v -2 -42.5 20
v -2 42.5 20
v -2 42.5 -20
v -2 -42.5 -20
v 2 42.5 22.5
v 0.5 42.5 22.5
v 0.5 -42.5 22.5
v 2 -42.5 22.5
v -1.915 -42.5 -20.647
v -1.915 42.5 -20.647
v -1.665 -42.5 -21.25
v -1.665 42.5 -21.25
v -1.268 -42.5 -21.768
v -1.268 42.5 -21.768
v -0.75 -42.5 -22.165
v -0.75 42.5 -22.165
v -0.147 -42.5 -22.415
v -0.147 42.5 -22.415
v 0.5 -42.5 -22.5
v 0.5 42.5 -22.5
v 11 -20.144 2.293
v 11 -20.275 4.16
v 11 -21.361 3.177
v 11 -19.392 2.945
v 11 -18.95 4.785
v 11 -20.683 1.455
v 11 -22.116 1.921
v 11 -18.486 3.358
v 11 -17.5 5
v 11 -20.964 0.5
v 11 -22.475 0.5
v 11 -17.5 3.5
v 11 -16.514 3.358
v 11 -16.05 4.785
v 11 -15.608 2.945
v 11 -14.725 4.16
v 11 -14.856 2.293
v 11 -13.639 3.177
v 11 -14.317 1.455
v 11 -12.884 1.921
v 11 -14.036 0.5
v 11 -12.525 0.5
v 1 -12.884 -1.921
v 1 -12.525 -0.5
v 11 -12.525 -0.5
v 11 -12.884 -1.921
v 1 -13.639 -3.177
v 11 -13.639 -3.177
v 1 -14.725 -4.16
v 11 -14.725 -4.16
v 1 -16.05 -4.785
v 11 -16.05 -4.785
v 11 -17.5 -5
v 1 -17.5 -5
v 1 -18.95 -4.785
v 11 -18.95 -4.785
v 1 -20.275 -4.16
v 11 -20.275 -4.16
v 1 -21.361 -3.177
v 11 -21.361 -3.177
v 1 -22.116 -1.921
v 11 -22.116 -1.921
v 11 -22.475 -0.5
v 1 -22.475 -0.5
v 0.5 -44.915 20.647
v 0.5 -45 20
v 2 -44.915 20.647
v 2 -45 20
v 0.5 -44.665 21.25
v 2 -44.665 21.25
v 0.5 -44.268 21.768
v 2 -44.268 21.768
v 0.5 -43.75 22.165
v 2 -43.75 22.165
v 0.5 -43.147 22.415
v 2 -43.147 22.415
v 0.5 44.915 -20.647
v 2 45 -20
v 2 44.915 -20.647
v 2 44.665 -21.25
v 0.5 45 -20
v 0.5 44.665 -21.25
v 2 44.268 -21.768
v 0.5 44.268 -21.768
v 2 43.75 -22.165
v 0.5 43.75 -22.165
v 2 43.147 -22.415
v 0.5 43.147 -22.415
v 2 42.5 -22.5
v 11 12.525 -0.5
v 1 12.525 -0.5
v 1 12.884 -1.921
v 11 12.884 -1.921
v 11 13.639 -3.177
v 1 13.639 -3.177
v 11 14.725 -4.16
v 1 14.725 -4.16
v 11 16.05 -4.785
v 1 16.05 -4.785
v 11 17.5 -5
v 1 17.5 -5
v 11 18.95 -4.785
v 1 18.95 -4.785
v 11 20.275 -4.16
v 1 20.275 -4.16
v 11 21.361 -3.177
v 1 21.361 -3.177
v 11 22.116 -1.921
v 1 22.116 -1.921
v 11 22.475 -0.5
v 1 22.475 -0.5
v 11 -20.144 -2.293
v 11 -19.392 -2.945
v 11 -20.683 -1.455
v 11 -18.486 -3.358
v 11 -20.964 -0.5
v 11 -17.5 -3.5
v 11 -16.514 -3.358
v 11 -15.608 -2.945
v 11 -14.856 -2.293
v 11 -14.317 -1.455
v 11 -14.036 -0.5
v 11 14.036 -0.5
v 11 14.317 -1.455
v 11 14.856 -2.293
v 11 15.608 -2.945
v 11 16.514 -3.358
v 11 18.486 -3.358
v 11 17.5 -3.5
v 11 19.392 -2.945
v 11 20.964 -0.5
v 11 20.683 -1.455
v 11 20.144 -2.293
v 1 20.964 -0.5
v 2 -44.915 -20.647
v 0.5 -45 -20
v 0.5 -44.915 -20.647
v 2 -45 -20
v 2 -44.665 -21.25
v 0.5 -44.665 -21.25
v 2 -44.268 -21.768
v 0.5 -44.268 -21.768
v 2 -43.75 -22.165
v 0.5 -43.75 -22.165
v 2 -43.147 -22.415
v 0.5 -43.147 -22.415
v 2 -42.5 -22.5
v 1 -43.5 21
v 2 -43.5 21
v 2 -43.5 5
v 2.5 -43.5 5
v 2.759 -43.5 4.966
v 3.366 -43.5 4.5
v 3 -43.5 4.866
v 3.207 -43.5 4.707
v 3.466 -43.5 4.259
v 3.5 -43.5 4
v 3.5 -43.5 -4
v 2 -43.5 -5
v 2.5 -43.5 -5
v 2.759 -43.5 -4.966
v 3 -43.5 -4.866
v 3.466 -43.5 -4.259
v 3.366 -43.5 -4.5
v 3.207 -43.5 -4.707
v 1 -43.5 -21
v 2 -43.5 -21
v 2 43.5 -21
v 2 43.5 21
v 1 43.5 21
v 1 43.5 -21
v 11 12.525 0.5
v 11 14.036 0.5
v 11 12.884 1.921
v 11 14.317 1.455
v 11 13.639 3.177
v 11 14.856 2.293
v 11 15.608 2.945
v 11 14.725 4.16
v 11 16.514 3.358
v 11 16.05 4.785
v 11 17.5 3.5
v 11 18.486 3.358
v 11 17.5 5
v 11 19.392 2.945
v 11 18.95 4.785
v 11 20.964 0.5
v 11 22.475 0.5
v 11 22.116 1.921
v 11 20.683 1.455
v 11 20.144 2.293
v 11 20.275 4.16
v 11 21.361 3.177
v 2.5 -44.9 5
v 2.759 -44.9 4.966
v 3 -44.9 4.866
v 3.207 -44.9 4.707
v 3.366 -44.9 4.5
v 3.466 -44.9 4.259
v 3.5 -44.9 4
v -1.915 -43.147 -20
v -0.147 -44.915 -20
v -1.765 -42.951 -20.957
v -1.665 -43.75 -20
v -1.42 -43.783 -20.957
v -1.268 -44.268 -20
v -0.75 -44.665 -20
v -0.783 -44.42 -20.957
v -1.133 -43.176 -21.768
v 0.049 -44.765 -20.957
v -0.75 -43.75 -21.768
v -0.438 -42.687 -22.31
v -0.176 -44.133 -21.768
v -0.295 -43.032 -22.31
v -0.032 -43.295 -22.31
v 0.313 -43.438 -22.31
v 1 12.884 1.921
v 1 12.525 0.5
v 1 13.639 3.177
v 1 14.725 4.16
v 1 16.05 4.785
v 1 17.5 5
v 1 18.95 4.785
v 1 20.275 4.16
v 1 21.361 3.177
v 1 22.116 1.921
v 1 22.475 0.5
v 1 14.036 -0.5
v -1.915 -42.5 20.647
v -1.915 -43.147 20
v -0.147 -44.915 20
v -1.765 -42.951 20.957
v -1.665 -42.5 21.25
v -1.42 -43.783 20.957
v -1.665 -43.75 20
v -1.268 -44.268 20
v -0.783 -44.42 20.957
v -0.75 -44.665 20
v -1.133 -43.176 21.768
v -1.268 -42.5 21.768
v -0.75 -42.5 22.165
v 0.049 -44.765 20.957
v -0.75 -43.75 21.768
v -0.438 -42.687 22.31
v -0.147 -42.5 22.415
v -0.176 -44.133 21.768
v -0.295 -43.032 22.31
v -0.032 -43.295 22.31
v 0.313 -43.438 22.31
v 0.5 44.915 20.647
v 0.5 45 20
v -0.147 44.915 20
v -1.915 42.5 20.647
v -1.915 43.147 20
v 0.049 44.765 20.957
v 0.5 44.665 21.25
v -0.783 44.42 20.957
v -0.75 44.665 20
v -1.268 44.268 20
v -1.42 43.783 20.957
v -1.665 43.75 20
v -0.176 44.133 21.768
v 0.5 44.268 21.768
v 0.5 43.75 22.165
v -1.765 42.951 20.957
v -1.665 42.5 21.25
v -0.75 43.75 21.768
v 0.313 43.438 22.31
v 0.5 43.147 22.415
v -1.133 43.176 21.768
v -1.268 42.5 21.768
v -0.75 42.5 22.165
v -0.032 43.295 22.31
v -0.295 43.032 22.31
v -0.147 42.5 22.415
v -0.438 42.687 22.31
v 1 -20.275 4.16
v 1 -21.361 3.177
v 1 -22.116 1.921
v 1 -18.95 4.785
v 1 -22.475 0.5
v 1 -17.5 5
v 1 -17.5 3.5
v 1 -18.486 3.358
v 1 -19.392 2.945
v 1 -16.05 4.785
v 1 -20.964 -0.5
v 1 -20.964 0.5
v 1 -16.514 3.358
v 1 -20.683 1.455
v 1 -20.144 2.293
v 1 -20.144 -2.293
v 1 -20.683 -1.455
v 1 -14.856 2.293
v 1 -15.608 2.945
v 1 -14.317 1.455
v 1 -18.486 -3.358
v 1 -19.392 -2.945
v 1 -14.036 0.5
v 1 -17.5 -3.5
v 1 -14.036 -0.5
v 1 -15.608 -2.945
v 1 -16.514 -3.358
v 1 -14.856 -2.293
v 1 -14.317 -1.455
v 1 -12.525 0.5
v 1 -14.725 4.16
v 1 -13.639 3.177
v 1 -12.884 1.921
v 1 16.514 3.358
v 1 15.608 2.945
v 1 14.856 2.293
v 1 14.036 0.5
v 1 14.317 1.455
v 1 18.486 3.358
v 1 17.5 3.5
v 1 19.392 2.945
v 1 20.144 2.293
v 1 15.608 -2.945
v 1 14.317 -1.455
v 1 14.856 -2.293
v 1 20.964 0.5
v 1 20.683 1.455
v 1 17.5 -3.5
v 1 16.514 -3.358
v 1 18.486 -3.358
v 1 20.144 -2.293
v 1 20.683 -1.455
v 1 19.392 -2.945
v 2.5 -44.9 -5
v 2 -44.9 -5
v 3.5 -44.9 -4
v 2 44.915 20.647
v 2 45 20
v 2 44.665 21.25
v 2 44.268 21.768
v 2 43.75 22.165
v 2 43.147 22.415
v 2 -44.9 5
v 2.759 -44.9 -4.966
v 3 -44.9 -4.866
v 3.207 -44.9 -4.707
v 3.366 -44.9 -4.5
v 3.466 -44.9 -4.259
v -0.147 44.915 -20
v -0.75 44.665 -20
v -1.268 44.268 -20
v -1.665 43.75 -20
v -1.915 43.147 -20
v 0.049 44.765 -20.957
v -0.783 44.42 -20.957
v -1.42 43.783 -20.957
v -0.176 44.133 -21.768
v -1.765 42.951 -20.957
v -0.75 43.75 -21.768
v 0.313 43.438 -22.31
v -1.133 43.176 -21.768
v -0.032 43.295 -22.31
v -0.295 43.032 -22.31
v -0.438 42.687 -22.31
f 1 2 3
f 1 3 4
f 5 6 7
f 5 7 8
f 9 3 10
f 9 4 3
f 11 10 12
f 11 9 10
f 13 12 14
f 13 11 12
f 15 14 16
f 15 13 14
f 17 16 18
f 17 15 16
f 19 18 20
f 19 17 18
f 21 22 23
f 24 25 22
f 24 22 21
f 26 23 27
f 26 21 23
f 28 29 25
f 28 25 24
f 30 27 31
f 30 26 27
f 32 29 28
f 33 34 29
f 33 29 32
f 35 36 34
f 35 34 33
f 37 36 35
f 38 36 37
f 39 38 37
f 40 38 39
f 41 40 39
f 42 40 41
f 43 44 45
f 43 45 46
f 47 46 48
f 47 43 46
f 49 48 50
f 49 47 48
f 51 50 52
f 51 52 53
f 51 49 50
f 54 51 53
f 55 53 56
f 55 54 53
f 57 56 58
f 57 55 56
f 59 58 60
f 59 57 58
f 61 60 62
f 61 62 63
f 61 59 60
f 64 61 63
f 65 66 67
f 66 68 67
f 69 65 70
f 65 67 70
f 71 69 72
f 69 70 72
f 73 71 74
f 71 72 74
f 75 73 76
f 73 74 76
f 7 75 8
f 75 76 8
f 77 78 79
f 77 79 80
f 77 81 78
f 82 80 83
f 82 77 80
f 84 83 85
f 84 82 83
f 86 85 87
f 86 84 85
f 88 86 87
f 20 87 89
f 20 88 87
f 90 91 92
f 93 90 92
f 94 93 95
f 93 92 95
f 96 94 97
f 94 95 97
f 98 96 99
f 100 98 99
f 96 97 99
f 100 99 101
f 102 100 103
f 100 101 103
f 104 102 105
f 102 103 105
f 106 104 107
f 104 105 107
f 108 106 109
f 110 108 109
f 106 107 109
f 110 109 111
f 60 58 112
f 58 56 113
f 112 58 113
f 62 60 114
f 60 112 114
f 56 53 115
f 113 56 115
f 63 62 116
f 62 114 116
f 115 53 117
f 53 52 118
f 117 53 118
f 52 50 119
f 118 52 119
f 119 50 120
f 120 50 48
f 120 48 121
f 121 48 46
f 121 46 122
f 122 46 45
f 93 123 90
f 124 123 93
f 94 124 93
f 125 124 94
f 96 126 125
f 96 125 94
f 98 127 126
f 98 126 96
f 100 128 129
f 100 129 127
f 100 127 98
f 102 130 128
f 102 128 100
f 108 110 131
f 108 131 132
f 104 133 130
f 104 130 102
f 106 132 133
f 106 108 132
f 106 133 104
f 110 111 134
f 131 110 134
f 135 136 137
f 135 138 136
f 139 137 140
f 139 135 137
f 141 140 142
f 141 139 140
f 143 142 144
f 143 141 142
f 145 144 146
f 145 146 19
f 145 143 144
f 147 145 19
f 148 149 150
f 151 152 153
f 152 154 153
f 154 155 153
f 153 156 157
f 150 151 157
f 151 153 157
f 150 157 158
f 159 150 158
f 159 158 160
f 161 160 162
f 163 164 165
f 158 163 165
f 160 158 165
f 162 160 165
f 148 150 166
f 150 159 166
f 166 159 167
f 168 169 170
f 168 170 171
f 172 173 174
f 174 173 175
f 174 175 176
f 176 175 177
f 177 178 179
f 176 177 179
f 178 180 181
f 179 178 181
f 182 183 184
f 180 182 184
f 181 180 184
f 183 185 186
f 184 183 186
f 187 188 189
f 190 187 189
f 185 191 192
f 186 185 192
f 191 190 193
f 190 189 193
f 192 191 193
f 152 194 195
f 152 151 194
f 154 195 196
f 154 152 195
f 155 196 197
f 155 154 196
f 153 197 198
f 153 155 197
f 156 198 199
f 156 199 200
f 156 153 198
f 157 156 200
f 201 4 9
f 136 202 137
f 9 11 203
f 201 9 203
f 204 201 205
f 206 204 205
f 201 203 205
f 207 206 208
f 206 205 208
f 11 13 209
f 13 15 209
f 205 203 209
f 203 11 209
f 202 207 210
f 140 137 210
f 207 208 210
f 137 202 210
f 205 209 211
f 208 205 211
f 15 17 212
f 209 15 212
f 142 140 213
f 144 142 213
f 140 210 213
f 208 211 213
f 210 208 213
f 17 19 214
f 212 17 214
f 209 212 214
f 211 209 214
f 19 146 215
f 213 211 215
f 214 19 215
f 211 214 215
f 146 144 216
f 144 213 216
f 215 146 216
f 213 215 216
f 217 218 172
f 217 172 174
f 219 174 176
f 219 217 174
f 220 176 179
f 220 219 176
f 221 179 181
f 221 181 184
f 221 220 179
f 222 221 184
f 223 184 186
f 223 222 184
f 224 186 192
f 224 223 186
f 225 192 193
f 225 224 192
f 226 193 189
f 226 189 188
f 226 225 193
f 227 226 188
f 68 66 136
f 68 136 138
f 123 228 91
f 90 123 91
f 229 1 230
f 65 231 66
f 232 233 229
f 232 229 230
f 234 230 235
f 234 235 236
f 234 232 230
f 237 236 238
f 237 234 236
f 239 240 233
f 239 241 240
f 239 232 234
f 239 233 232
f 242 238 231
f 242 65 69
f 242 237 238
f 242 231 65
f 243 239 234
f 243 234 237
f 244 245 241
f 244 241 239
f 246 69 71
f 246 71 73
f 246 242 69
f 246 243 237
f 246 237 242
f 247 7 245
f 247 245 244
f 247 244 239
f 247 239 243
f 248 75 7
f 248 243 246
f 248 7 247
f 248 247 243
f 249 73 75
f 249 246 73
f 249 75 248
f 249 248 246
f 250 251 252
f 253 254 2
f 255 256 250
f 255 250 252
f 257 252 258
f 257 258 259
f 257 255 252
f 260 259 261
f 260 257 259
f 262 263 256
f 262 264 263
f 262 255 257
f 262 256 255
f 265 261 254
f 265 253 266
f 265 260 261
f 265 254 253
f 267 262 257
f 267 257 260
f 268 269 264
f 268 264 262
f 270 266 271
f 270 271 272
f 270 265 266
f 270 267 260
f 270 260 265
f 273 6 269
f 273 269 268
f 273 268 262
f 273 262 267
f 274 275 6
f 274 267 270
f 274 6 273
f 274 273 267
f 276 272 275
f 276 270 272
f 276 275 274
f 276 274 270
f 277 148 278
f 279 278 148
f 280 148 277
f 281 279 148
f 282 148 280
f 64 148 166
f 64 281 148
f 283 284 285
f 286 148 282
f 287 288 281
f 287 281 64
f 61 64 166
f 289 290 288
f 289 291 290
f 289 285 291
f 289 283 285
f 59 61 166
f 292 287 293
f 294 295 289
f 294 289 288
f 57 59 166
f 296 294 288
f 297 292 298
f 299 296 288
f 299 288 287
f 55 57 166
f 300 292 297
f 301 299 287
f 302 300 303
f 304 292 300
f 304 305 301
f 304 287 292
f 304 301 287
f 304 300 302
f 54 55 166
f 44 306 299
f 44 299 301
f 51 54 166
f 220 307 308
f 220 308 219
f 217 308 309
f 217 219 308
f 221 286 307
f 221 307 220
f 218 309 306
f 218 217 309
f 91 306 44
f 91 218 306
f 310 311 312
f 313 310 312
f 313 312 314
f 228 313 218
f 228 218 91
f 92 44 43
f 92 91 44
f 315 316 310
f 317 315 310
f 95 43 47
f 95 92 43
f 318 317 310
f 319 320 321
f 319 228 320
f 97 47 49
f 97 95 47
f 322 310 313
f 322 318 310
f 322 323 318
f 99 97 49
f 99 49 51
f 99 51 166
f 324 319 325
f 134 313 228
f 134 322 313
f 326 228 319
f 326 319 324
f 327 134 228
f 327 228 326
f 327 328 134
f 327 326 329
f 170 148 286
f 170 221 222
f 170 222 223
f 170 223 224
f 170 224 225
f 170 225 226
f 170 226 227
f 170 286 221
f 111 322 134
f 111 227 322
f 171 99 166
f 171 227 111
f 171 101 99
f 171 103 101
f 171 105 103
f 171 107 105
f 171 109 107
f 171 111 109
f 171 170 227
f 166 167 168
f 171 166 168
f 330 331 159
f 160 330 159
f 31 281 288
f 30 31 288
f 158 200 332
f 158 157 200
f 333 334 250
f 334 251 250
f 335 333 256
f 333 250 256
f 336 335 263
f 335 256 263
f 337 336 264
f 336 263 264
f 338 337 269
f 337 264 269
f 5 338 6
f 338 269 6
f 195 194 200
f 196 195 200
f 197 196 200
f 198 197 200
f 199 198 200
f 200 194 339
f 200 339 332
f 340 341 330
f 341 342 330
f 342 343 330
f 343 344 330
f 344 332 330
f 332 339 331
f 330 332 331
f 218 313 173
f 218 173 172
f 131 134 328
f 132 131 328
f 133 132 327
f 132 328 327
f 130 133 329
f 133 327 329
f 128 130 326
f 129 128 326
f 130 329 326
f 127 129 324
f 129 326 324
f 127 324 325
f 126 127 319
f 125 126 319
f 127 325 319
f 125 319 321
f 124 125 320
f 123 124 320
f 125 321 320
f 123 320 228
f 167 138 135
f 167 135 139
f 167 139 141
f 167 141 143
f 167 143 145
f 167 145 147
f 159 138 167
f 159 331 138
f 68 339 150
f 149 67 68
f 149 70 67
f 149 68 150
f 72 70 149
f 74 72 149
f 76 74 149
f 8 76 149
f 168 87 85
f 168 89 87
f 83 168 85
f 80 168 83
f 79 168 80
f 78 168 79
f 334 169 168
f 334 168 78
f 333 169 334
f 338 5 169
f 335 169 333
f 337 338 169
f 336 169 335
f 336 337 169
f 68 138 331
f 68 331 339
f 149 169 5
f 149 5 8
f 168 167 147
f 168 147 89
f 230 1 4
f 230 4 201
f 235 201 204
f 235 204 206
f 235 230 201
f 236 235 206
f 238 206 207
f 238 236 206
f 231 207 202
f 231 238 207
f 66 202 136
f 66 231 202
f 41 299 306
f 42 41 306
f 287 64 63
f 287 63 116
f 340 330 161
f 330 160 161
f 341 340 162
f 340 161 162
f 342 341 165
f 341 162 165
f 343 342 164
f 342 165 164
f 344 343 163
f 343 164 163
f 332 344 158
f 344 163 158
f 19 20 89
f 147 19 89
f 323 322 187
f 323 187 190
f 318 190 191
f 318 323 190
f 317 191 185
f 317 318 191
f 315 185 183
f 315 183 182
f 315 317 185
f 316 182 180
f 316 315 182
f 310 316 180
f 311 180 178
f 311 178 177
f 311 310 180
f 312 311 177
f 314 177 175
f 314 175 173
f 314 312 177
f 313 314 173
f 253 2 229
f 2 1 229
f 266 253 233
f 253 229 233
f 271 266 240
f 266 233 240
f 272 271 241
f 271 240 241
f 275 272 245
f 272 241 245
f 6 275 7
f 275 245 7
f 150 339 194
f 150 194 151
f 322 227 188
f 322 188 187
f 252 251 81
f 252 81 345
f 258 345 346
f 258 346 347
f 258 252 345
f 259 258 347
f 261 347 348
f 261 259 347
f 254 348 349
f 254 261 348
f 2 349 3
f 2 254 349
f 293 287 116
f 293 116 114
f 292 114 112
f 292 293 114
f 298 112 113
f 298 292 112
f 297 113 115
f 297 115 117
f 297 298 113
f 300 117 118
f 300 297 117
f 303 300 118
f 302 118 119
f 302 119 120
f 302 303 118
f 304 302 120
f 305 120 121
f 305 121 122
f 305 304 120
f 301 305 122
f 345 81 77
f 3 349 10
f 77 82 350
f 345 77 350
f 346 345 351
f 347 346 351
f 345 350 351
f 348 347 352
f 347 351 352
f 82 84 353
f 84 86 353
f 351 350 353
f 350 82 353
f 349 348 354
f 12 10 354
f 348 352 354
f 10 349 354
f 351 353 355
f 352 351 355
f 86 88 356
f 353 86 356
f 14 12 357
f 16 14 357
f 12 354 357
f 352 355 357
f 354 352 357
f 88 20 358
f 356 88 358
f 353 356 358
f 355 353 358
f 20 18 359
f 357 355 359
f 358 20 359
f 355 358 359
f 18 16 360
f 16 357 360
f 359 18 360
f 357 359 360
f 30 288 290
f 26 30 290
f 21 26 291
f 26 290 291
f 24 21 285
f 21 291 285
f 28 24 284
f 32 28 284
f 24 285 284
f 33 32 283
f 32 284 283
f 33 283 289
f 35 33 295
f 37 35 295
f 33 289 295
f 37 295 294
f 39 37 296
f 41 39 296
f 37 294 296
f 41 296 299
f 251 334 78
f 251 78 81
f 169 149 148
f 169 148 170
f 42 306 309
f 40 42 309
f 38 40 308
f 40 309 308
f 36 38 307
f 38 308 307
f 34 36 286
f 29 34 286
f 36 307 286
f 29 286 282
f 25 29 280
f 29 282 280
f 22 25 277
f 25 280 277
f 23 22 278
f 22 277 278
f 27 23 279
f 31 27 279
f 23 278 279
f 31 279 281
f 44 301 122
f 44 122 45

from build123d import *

# Parameters (mm, degrees)
EXTRUDE_3_DEPTH      = 22.5
EXTRUDE_3_DEPTH_BACK = 22.5
FILLET_3_R           = 2.5
SKETCH_6_W           = 42
SKETCH_6_H           = 87
CUT_EXTRUDE_2_DEPTH  = 1
EXTRUDE_5_DEPTH      = 10
SKETCH_9_W           = 10
SKETCH_9_H           = 1.4
EXTRUDE_6_DEPTH      = 1.5
FILLET_4_R           = 1


with BuildPart() as part:
    # Sketch 3 → Extrude 3 (new body, two sides)
    with BuildSketch(Plane.XY) as extrude_3_sk:
        with BuildLine():
            Line((0.5, -45), (2, -45))
            Line((2, -45), (2, 45))
            Line((2, 45), (0.5, 45))
            ThreePointArc((0.5, 45), (-1.267766953, 44.267766953), (-2, 42.5))
            Line((-2, 42.5), (-2, -42.5))
            ThreePointArc((-2, -42.5), (-1.267766953, -44.267766953), (0.5, -45))
        make_face()
    extrude(amount=EXTRUDE_3_DEPTH)
    extrude(extrude_3_sk.sketch, amount=-EXTRUDE_3_DEPTH_BACK)

    # Fillet 3
    fillet_3_edges = [part.edges().sort_by_distance(p)[0] for p in [
        (-1.267766953, 44.267766953, -22.5),
        (-2, 0, -22.5),
        (1.25, 45, 22.5),
        (-1.267766953, 44.267766953, 22.5),
        (-2, 0, 22.5),
        (-1.267766953, -44.267766953, 22.5),
        (1.25, -45, 22.5),
        (-1.267766953, -44.267766953, -22.5),
        (1.25, -45, -22.5),
        (1.25, 45, -22.5),
    ]]
    fillet(fillet_3_edges, radius=FILLET_3_R)

    # Sketch 6 → Cut-Extrude 2 (cut)
    with BuildSketch(Plane(origin=(2, 0, 0), x_dir=(0, 0, -1), z_dir=(1, 0, 0))):
        Rectangle(SKETCH_6_W, SKETCH_6_H)
    extrude(amount=-CUT_EXTRUDE_2_DEPTH, mode=Mode.SUBTRACT)

    # Sketch 7 → Extrude 5 (add)
    with BuildSketch(Plane(origin=(1, 0, 0), x_dir=(0, 0, -1), z_dir=(1, 0, 0))):
        with BuildLine():
            Line((-0.5, 22.474937186), (-0.5, 20.964101615))
            ThreePointArc((-0.5, 20.964101615), (-3.5, 17.5), (-0.5, 14.035898385))
            Line((-0.5, 14.035898385), (-0.5, 12.525062814))
            ThreePointArc((-0.5, 12.525062814), (-5, 17.5), (-0.5, 22.474937186))
        make_face()
        with BuildLine():
            Line((0.5, 22.474937186), (0.5, 20.964101615))
            ThreePointArc((0.5, 20.964101615), (3.5, 17.5), (0.5, 14.035898385))
            Line((0.5, 14.035898385), (0.5, 12.525062814))
            ThreePointArc((0.5, 12.525062814), (5, 17.5), (0.5, 22.474937186))
        make_face()
        with BuildLine():
            Line((-0.5, -14.035898385), (-0.5, -12.525062814))
            ThreePointArc((-0.5, -12.525062814), (-5, -17.5), (-0.5, -22.474937186))
            Line((-0.5, -22.474937186), (-0.5, -20.964101615))
            ThreePointArc((-0.5, -20.964101615), (-3.5, -17.5), (-0.5, -14.035898385))
        make_face()
        with BuildLine():
            Line((0.5, -14.035898385), (0.5, -12.525062814))
            ThreePointArc((0.5, -12.525062814), (5, -17.5), (0.5, -22.474937186))
            Line((0.5, -22.474937186), (0.5, -20.964101615))
            ThreePointArc((0.5, -20.964101615), (3.5, -17.5), (0.5, -14.035898385))
        make_face()
    extrude(amount=EXTRUDE_5_DEPTH)

    # Sketch 9 → Extrude 6 (add)
    with BuildSketch(Plane(origin=(2, 0, 0), x_dir=(0, 0, -1), z_dir=(1, 0, 0))):
        with Locations((0, -44.2)):
            Rectangle(SKETCH_9_W, SKETCH_9_H)
    extrude(amount=EXTRUDE_6_DEPTH)

    # Fillet 4
    fillet_4_edges = [part.edges().sort_by_distance(p)[0] for p in [
        (3.5, -44.2, 5),
        (3.5, -44.2, -5),
    ]]
    fillet(fillet_4_edges, radius=FILLET_4_R)


solid = part.part
